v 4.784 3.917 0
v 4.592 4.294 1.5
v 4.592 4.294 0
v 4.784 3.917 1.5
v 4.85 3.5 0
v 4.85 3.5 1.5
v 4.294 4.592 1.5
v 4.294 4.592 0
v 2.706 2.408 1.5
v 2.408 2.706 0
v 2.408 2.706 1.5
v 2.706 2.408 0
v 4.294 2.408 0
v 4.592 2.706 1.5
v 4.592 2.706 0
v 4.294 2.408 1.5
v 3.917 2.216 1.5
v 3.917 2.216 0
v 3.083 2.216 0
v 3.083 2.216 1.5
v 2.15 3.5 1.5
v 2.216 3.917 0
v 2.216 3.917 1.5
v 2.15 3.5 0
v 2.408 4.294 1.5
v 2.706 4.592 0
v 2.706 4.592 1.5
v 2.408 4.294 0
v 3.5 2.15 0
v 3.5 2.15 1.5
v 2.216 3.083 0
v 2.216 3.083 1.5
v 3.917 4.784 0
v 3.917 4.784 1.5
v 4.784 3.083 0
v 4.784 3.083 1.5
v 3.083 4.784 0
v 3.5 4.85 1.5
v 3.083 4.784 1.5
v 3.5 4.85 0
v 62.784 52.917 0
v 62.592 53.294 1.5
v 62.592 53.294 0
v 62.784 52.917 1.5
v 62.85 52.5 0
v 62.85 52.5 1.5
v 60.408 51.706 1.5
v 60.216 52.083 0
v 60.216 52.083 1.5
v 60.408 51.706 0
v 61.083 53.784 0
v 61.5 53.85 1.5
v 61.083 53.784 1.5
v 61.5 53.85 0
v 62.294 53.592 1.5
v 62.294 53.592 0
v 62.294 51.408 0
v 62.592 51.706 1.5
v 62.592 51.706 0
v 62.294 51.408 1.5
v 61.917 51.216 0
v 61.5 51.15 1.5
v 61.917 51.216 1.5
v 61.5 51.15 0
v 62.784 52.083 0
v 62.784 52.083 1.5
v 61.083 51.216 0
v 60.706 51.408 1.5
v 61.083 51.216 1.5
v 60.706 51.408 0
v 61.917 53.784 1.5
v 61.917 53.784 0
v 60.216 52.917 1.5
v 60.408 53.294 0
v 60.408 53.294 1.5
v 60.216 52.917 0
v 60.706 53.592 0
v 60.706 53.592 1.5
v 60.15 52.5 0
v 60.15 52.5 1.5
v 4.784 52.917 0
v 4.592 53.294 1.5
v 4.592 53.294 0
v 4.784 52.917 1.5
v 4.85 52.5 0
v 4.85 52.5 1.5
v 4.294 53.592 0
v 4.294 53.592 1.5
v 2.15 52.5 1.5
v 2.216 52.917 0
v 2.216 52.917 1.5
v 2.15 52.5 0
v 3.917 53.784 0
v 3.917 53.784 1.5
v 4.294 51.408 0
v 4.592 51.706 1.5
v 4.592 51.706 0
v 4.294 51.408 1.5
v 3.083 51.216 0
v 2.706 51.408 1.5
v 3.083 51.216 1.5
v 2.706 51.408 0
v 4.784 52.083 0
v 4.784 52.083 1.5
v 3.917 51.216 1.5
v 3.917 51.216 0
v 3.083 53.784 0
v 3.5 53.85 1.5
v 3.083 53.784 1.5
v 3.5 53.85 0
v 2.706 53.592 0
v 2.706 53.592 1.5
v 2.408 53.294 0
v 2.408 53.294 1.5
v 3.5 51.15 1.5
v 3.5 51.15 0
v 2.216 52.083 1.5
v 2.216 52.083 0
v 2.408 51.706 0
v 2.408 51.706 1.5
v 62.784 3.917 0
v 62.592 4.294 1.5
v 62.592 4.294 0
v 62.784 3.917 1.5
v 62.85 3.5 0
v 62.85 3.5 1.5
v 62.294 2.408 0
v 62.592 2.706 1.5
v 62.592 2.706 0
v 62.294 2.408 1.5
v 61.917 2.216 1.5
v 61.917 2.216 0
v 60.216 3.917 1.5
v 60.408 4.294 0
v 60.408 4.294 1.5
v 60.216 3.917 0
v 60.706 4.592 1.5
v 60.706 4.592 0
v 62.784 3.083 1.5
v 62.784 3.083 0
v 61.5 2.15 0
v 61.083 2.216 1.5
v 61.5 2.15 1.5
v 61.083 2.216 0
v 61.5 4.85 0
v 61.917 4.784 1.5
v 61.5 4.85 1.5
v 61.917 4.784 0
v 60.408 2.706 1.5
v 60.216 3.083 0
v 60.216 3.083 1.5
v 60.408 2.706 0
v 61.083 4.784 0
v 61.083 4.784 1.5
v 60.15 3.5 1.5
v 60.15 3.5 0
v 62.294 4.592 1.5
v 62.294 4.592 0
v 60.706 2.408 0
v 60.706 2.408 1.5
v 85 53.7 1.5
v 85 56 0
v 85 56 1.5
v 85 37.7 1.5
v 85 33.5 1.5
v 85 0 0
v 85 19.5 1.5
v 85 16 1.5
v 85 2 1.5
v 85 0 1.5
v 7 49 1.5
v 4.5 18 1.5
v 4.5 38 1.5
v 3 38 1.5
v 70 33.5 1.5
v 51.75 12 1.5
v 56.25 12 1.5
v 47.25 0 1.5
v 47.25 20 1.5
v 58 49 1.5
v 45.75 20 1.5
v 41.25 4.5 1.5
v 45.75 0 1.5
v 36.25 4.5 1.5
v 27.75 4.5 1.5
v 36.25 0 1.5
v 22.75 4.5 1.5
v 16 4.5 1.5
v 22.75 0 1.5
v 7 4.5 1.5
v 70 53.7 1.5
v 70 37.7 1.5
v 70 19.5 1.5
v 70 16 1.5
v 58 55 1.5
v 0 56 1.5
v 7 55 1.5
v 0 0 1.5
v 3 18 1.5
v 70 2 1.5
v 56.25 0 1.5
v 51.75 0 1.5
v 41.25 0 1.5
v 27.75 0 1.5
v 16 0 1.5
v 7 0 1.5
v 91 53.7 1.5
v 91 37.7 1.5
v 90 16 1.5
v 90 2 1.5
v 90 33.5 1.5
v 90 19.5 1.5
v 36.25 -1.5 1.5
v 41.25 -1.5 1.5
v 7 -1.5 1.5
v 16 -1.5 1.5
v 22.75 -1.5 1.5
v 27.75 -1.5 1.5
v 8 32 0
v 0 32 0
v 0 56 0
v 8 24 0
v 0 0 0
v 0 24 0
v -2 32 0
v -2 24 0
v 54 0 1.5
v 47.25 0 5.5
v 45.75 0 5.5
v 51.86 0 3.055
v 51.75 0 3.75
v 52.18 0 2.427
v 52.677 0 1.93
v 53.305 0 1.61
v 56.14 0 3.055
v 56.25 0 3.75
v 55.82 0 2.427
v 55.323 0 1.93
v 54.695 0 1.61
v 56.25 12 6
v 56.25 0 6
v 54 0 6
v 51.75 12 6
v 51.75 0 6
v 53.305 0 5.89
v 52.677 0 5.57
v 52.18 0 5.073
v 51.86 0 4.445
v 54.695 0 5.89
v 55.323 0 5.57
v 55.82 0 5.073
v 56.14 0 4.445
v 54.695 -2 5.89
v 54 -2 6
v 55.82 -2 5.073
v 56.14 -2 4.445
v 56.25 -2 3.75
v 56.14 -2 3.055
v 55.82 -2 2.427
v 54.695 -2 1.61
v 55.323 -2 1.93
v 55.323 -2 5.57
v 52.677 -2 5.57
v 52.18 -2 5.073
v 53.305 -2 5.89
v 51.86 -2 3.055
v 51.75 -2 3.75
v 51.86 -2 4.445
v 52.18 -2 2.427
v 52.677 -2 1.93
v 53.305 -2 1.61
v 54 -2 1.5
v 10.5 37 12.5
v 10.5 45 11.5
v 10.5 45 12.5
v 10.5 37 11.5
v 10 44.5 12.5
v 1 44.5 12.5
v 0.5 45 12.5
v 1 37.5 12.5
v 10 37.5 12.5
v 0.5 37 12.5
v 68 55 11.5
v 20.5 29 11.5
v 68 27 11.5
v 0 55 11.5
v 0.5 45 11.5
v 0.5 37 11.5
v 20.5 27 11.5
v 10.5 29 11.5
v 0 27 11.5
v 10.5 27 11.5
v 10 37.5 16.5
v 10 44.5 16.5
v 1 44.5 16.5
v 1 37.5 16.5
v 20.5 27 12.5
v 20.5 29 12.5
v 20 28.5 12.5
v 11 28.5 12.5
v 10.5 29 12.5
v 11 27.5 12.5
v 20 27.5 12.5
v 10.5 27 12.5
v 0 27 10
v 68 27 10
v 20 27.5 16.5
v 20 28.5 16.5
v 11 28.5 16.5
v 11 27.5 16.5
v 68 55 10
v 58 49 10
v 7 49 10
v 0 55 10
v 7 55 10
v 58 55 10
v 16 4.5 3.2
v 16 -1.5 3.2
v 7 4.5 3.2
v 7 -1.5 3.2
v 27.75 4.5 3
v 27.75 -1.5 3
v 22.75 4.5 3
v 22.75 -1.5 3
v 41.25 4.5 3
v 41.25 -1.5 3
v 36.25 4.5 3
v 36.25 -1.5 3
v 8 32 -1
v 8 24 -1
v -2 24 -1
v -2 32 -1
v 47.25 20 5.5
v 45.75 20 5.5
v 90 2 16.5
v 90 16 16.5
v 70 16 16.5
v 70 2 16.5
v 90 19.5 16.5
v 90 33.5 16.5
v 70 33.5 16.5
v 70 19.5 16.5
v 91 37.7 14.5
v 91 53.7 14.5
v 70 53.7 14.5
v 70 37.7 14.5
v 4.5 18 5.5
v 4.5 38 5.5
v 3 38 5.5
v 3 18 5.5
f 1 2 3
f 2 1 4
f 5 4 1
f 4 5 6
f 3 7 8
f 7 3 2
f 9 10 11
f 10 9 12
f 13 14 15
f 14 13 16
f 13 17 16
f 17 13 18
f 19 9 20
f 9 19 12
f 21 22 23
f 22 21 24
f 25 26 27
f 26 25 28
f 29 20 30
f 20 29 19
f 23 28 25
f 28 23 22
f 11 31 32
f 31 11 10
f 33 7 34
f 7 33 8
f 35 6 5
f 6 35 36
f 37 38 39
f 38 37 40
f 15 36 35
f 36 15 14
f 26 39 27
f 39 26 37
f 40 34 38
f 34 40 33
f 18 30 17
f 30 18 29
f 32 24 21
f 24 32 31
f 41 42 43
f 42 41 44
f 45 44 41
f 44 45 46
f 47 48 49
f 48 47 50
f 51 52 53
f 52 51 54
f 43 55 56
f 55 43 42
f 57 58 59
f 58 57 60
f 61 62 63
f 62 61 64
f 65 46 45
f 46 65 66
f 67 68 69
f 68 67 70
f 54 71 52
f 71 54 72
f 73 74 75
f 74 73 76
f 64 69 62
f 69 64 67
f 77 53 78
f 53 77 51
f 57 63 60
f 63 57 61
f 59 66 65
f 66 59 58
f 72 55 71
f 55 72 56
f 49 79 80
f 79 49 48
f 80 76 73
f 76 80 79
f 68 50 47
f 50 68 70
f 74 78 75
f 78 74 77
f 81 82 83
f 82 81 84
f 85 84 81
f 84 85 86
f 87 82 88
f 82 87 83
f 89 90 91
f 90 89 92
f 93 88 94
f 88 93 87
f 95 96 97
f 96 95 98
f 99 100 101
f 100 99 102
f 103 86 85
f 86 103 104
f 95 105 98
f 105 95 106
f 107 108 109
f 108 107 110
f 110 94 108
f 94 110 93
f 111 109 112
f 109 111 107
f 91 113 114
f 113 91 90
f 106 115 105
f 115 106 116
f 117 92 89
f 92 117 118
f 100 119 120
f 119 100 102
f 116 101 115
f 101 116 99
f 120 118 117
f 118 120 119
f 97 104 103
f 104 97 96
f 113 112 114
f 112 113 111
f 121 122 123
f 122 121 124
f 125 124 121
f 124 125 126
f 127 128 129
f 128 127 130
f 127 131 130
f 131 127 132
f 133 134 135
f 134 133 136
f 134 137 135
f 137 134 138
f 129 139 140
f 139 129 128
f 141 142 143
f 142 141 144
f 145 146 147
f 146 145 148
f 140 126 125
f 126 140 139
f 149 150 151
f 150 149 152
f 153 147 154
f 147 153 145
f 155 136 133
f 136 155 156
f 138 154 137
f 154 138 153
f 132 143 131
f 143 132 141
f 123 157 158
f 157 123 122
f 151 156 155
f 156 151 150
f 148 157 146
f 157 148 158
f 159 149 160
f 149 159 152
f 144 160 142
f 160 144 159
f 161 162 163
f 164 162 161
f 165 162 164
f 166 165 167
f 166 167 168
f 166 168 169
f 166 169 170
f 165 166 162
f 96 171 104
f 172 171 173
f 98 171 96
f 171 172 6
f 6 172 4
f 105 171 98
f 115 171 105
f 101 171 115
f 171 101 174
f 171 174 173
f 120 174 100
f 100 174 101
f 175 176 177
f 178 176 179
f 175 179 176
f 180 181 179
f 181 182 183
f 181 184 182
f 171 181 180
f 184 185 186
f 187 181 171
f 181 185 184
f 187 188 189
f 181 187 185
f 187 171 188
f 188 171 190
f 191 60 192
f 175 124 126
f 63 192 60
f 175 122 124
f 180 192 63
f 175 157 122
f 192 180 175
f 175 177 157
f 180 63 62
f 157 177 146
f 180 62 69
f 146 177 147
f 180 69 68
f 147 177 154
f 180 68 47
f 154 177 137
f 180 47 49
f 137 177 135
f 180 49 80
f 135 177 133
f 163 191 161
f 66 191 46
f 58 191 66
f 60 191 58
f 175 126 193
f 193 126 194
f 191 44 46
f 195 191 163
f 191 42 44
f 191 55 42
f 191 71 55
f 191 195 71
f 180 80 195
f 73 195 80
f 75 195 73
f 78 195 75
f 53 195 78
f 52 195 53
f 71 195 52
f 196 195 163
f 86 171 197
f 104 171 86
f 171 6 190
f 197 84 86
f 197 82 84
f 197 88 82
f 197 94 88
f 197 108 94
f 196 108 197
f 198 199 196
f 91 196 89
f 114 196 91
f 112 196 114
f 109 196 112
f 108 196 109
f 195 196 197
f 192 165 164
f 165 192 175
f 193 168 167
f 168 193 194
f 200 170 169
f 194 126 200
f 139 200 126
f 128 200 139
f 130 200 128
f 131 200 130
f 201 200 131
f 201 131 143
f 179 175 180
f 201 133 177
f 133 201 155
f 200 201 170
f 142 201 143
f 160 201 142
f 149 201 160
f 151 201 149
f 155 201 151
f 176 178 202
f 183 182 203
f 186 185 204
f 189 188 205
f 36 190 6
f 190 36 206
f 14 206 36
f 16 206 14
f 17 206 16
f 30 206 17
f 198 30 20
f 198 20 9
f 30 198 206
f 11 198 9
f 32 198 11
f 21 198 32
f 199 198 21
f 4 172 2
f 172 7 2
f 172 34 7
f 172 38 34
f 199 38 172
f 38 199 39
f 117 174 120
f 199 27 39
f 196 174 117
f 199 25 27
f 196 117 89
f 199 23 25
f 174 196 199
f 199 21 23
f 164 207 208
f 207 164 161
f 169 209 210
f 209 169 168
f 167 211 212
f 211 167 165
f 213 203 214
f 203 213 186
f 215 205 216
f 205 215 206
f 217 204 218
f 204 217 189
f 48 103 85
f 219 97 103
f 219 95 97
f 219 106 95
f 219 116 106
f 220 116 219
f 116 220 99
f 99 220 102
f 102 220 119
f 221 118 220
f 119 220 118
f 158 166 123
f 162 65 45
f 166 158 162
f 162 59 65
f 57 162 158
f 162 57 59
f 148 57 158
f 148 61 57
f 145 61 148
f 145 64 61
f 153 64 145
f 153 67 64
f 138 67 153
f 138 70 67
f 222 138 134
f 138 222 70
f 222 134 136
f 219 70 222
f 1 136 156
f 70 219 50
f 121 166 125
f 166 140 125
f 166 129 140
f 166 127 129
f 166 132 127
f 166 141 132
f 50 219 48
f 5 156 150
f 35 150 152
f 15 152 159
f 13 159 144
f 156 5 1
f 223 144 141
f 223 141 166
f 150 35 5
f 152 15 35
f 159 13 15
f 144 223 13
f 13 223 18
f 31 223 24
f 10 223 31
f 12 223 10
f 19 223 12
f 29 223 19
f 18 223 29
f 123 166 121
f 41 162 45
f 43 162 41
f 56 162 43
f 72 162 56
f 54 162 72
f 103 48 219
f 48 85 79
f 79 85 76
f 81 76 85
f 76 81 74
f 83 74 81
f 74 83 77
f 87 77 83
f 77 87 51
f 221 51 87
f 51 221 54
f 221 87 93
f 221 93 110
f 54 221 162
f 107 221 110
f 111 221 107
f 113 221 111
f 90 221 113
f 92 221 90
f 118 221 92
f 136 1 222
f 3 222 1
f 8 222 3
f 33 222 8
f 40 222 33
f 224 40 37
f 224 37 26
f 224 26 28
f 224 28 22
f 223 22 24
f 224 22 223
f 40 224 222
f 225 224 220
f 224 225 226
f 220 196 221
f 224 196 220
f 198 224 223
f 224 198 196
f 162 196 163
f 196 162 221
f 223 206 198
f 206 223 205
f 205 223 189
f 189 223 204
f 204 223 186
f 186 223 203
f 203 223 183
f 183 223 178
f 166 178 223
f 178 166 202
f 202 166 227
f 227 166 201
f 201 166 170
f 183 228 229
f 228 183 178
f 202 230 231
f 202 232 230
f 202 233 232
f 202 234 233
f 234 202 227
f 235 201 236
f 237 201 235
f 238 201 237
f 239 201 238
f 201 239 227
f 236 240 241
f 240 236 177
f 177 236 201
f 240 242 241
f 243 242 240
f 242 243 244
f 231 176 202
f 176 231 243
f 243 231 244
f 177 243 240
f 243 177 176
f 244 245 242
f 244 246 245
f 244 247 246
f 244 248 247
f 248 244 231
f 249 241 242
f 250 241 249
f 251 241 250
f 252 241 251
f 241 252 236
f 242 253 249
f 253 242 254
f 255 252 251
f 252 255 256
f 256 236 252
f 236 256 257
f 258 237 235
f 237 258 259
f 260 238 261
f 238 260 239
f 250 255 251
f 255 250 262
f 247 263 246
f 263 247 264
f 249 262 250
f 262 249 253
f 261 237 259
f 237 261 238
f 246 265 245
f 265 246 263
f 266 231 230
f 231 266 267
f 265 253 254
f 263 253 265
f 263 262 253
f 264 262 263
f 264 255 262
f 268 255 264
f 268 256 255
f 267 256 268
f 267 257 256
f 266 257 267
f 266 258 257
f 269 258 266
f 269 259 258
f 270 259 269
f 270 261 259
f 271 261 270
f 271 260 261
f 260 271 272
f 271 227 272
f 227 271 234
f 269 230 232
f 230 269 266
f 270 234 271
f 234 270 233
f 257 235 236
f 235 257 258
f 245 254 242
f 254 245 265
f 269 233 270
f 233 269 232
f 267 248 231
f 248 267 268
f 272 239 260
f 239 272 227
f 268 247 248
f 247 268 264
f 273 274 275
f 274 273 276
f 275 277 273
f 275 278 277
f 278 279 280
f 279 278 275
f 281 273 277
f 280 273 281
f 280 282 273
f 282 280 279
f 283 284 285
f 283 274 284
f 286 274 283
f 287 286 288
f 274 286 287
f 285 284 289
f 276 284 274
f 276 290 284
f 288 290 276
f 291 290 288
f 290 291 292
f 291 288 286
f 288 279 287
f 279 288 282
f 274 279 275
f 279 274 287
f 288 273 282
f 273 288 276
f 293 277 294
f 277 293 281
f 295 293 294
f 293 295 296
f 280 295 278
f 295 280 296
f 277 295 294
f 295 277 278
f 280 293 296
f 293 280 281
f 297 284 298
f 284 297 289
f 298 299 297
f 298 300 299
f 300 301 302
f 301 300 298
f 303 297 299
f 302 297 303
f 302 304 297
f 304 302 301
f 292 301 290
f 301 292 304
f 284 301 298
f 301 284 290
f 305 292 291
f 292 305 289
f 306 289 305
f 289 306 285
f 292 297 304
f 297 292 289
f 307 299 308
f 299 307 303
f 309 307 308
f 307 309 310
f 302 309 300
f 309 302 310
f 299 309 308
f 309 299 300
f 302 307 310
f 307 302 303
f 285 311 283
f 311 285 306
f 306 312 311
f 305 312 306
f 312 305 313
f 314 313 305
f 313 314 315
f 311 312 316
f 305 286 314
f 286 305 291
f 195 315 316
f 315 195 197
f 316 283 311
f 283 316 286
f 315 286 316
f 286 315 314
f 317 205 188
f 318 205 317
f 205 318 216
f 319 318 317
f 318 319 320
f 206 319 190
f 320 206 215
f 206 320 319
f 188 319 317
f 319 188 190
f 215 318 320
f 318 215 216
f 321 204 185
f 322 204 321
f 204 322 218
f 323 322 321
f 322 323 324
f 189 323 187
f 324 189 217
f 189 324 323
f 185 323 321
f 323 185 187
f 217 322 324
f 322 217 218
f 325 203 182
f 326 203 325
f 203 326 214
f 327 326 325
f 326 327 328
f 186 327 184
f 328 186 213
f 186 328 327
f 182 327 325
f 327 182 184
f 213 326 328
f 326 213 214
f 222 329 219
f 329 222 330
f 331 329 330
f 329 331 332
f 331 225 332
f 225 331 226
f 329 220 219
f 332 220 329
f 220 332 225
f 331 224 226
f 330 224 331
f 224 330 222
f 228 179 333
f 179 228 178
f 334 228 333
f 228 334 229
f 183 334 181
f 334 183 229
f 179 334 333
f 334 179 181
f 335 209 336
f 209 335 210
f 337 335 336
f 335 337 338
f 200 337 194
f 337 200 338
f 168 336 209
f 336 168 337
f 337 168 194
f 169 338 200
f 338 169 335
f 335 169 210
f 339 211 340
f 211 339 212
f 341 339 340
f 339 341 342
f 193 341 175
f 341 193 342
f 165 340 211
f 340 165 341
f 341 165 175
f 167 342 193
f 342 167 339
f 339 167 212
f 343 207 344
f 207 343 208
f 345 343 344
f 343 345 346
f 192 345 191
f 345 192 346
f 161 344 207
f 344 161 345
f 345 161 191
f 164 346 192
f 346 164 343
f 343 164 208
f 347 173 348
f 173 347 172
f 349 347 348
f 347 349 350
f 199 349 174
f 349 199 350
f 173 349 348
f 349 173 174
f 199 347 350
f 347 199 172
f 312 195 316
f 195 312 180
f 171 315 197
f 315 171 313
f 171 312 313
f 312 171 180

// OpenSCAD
$fn = 20;

module RPi4() {
	boardDepth = 56;
	boardWidth = 85;
	UsbAndEthernetOffset = boardWidth - 15;

	BaseBoard();
	translate([7, -1.5, baseBoardHeight]) UsbC();
	translate([3.5 + 7.7 + 14.8 - HdmiMiniWidth/2, -1.5, baseBoardHeight]) HdmiMini();
	translate([3.5 + 7.7 + 14.8 + 13.5 - HdmiMiniWidth/2, -1.5, baseBoardHeight]) HdmiMini();

	//SD
	translate([-2,boardDepth/2-sdDepth/2, -sdHeight]) SdCard();

	//Camera Ribbon Cable
	translate([3.5 + 7.7 + 14.8 + 13.5 + 7- RibbonHeaderWidth/2, 0, baseBoardHeight]) RibbonHeader();

	translate([3.5 + 7.7 + 14.8 + 13.5 + 7 + 7.5 - HeadphoneJackWidth/2, 0, baseBoardHeight]) HeadphoneJack();
	translate([UsbAndEthernetOffset, 9 - UsbADepth/2, baseBoardHeight]) UsbA();
	translate([UsbAndEthernetOffset, 26.5 - UsbADepth/2, baseBoardHeight]) UsbA();
	translate([UsbAndEthernetOffset, 45.7 - EthernetDepth/2, baseBoardHeight]) Ethernet();

	//Diplay Ribbon Cable
	translate([3,HoleOffset+24.5-RibbonHeaderDepth/2, baseBoardHeight]) RibbonHeader();

	//GPIO
	GPIOHeight = 8.5;
	GPIODepth = 6;
	senseHatDepth = 28;

	translate([7, 49, baseBoardHeight]) GPIO();
	translate([0, 49+GPIODepth-senseHatDepth, baseBoardHeight + GPIOHeight]) SenseHat();

	baseBoardHeight = 1.5;
	RPiColor = "Green";
	HoleOffset = 3.5;
	module BaseBoard() {
		color( c = RPiColor) {
			difference() { 
				cube([85, 56, baseBoardHeight]);
				Holes(HoleOffset, HoleOffset);
			}
		}
	}

	HoleDistance = 58;
	module Holes(bottomLeftX, bottomLeftY) {
		translate([bottomLeftX, bottomLeftY, 0]) {
			Hole(0,0,0);
			Hole(HoleDistance, 49, 0);
			Hole(0, 49, 0);
			Hole(HoleDistance, 0, 0);
		}
	}

	module Hole(x, y, z) {
		translate([x, y, z-5]) {
			cylinder(d=2.7, h=10);
		}
	};

	module UsbC() {
		cube([9, 6, 3.2-baseBoardHeight]);
	}

	HdmiMiniWidth = 6.5;
	module HdmiMini() {
		cube([5, 6, 3.0-baseBoardHeight]);
	}

	RibbonHeaderWidth = 1.5;
	RibbonHeaderDepth = 20;
	RibbonHeaderColor = "Cornsilk";
	module RibbonHeader() {
		color(RibbonHeaderColor) {
			cube([RibbonHeaderWidth, RibbonHeaderDepth, 5.5-baseBoardHeight]);
		}
	}

	HeadphoneJackWidth = 4.5;
	module HeadphoneJack() {
		cube([HeadphoneJackWidth, 12, 6-baseBoardHeight]);
		translate([HeadphoneJackWidth/2, 0, HeadphoneJackWidth/2]) rotate([90,0,0]) cylinder(d=HeadphoneJackWidth, h=2);
	}

	UsbADepth = 14;
	module UsbA() {
		cube([20, UsbADepth, 15]);
	}

	EthernetDepth = 16;
	EthernetWidth = 21;
	module Ethernet() {
		cube([EthernetWidth, EthernetDepth, 13]);
	}

	module GPIO() {
		color("black") cube([HoleDistance - 3.5*2, GPIODepth, GPIOHeight]);
	}

	module SenseHat() {
		color("blue") cube([UsbAndEthernetOffset-2, senseHatDepth, baseBoardHeight]);
		headerDepth = 8;
		headerWidth = 10;
		xOffset = 0.5;
		translate([xOffset, senseHatDepth/2 - headerDepth/2, baseBoardHeight]) {
			color("yellow") cube([headerWidth, headerDepth, 1]);
			translate([0.5, 0.5]) color("grey") cube([headerWidth-1, headerDepth-1, 5]);
		}
		smallHeaderDepth = 2;
		translate([headerWidth + xOffset ,0,baseBoardHeight]) {
			color("yellow") cube([headerWidth, smallHeaderDepth, 1]);
			translate([0.5, 0.5]) color("grey") cube([headerWidth-1, smallHeaderDepth-1, 5]);
		}
	}

	sdDepth = 8;
	sdHeight = 1;
	module SdCard() {
		cube([10, sdDepth, 1]);
	}
}
RPi4();
